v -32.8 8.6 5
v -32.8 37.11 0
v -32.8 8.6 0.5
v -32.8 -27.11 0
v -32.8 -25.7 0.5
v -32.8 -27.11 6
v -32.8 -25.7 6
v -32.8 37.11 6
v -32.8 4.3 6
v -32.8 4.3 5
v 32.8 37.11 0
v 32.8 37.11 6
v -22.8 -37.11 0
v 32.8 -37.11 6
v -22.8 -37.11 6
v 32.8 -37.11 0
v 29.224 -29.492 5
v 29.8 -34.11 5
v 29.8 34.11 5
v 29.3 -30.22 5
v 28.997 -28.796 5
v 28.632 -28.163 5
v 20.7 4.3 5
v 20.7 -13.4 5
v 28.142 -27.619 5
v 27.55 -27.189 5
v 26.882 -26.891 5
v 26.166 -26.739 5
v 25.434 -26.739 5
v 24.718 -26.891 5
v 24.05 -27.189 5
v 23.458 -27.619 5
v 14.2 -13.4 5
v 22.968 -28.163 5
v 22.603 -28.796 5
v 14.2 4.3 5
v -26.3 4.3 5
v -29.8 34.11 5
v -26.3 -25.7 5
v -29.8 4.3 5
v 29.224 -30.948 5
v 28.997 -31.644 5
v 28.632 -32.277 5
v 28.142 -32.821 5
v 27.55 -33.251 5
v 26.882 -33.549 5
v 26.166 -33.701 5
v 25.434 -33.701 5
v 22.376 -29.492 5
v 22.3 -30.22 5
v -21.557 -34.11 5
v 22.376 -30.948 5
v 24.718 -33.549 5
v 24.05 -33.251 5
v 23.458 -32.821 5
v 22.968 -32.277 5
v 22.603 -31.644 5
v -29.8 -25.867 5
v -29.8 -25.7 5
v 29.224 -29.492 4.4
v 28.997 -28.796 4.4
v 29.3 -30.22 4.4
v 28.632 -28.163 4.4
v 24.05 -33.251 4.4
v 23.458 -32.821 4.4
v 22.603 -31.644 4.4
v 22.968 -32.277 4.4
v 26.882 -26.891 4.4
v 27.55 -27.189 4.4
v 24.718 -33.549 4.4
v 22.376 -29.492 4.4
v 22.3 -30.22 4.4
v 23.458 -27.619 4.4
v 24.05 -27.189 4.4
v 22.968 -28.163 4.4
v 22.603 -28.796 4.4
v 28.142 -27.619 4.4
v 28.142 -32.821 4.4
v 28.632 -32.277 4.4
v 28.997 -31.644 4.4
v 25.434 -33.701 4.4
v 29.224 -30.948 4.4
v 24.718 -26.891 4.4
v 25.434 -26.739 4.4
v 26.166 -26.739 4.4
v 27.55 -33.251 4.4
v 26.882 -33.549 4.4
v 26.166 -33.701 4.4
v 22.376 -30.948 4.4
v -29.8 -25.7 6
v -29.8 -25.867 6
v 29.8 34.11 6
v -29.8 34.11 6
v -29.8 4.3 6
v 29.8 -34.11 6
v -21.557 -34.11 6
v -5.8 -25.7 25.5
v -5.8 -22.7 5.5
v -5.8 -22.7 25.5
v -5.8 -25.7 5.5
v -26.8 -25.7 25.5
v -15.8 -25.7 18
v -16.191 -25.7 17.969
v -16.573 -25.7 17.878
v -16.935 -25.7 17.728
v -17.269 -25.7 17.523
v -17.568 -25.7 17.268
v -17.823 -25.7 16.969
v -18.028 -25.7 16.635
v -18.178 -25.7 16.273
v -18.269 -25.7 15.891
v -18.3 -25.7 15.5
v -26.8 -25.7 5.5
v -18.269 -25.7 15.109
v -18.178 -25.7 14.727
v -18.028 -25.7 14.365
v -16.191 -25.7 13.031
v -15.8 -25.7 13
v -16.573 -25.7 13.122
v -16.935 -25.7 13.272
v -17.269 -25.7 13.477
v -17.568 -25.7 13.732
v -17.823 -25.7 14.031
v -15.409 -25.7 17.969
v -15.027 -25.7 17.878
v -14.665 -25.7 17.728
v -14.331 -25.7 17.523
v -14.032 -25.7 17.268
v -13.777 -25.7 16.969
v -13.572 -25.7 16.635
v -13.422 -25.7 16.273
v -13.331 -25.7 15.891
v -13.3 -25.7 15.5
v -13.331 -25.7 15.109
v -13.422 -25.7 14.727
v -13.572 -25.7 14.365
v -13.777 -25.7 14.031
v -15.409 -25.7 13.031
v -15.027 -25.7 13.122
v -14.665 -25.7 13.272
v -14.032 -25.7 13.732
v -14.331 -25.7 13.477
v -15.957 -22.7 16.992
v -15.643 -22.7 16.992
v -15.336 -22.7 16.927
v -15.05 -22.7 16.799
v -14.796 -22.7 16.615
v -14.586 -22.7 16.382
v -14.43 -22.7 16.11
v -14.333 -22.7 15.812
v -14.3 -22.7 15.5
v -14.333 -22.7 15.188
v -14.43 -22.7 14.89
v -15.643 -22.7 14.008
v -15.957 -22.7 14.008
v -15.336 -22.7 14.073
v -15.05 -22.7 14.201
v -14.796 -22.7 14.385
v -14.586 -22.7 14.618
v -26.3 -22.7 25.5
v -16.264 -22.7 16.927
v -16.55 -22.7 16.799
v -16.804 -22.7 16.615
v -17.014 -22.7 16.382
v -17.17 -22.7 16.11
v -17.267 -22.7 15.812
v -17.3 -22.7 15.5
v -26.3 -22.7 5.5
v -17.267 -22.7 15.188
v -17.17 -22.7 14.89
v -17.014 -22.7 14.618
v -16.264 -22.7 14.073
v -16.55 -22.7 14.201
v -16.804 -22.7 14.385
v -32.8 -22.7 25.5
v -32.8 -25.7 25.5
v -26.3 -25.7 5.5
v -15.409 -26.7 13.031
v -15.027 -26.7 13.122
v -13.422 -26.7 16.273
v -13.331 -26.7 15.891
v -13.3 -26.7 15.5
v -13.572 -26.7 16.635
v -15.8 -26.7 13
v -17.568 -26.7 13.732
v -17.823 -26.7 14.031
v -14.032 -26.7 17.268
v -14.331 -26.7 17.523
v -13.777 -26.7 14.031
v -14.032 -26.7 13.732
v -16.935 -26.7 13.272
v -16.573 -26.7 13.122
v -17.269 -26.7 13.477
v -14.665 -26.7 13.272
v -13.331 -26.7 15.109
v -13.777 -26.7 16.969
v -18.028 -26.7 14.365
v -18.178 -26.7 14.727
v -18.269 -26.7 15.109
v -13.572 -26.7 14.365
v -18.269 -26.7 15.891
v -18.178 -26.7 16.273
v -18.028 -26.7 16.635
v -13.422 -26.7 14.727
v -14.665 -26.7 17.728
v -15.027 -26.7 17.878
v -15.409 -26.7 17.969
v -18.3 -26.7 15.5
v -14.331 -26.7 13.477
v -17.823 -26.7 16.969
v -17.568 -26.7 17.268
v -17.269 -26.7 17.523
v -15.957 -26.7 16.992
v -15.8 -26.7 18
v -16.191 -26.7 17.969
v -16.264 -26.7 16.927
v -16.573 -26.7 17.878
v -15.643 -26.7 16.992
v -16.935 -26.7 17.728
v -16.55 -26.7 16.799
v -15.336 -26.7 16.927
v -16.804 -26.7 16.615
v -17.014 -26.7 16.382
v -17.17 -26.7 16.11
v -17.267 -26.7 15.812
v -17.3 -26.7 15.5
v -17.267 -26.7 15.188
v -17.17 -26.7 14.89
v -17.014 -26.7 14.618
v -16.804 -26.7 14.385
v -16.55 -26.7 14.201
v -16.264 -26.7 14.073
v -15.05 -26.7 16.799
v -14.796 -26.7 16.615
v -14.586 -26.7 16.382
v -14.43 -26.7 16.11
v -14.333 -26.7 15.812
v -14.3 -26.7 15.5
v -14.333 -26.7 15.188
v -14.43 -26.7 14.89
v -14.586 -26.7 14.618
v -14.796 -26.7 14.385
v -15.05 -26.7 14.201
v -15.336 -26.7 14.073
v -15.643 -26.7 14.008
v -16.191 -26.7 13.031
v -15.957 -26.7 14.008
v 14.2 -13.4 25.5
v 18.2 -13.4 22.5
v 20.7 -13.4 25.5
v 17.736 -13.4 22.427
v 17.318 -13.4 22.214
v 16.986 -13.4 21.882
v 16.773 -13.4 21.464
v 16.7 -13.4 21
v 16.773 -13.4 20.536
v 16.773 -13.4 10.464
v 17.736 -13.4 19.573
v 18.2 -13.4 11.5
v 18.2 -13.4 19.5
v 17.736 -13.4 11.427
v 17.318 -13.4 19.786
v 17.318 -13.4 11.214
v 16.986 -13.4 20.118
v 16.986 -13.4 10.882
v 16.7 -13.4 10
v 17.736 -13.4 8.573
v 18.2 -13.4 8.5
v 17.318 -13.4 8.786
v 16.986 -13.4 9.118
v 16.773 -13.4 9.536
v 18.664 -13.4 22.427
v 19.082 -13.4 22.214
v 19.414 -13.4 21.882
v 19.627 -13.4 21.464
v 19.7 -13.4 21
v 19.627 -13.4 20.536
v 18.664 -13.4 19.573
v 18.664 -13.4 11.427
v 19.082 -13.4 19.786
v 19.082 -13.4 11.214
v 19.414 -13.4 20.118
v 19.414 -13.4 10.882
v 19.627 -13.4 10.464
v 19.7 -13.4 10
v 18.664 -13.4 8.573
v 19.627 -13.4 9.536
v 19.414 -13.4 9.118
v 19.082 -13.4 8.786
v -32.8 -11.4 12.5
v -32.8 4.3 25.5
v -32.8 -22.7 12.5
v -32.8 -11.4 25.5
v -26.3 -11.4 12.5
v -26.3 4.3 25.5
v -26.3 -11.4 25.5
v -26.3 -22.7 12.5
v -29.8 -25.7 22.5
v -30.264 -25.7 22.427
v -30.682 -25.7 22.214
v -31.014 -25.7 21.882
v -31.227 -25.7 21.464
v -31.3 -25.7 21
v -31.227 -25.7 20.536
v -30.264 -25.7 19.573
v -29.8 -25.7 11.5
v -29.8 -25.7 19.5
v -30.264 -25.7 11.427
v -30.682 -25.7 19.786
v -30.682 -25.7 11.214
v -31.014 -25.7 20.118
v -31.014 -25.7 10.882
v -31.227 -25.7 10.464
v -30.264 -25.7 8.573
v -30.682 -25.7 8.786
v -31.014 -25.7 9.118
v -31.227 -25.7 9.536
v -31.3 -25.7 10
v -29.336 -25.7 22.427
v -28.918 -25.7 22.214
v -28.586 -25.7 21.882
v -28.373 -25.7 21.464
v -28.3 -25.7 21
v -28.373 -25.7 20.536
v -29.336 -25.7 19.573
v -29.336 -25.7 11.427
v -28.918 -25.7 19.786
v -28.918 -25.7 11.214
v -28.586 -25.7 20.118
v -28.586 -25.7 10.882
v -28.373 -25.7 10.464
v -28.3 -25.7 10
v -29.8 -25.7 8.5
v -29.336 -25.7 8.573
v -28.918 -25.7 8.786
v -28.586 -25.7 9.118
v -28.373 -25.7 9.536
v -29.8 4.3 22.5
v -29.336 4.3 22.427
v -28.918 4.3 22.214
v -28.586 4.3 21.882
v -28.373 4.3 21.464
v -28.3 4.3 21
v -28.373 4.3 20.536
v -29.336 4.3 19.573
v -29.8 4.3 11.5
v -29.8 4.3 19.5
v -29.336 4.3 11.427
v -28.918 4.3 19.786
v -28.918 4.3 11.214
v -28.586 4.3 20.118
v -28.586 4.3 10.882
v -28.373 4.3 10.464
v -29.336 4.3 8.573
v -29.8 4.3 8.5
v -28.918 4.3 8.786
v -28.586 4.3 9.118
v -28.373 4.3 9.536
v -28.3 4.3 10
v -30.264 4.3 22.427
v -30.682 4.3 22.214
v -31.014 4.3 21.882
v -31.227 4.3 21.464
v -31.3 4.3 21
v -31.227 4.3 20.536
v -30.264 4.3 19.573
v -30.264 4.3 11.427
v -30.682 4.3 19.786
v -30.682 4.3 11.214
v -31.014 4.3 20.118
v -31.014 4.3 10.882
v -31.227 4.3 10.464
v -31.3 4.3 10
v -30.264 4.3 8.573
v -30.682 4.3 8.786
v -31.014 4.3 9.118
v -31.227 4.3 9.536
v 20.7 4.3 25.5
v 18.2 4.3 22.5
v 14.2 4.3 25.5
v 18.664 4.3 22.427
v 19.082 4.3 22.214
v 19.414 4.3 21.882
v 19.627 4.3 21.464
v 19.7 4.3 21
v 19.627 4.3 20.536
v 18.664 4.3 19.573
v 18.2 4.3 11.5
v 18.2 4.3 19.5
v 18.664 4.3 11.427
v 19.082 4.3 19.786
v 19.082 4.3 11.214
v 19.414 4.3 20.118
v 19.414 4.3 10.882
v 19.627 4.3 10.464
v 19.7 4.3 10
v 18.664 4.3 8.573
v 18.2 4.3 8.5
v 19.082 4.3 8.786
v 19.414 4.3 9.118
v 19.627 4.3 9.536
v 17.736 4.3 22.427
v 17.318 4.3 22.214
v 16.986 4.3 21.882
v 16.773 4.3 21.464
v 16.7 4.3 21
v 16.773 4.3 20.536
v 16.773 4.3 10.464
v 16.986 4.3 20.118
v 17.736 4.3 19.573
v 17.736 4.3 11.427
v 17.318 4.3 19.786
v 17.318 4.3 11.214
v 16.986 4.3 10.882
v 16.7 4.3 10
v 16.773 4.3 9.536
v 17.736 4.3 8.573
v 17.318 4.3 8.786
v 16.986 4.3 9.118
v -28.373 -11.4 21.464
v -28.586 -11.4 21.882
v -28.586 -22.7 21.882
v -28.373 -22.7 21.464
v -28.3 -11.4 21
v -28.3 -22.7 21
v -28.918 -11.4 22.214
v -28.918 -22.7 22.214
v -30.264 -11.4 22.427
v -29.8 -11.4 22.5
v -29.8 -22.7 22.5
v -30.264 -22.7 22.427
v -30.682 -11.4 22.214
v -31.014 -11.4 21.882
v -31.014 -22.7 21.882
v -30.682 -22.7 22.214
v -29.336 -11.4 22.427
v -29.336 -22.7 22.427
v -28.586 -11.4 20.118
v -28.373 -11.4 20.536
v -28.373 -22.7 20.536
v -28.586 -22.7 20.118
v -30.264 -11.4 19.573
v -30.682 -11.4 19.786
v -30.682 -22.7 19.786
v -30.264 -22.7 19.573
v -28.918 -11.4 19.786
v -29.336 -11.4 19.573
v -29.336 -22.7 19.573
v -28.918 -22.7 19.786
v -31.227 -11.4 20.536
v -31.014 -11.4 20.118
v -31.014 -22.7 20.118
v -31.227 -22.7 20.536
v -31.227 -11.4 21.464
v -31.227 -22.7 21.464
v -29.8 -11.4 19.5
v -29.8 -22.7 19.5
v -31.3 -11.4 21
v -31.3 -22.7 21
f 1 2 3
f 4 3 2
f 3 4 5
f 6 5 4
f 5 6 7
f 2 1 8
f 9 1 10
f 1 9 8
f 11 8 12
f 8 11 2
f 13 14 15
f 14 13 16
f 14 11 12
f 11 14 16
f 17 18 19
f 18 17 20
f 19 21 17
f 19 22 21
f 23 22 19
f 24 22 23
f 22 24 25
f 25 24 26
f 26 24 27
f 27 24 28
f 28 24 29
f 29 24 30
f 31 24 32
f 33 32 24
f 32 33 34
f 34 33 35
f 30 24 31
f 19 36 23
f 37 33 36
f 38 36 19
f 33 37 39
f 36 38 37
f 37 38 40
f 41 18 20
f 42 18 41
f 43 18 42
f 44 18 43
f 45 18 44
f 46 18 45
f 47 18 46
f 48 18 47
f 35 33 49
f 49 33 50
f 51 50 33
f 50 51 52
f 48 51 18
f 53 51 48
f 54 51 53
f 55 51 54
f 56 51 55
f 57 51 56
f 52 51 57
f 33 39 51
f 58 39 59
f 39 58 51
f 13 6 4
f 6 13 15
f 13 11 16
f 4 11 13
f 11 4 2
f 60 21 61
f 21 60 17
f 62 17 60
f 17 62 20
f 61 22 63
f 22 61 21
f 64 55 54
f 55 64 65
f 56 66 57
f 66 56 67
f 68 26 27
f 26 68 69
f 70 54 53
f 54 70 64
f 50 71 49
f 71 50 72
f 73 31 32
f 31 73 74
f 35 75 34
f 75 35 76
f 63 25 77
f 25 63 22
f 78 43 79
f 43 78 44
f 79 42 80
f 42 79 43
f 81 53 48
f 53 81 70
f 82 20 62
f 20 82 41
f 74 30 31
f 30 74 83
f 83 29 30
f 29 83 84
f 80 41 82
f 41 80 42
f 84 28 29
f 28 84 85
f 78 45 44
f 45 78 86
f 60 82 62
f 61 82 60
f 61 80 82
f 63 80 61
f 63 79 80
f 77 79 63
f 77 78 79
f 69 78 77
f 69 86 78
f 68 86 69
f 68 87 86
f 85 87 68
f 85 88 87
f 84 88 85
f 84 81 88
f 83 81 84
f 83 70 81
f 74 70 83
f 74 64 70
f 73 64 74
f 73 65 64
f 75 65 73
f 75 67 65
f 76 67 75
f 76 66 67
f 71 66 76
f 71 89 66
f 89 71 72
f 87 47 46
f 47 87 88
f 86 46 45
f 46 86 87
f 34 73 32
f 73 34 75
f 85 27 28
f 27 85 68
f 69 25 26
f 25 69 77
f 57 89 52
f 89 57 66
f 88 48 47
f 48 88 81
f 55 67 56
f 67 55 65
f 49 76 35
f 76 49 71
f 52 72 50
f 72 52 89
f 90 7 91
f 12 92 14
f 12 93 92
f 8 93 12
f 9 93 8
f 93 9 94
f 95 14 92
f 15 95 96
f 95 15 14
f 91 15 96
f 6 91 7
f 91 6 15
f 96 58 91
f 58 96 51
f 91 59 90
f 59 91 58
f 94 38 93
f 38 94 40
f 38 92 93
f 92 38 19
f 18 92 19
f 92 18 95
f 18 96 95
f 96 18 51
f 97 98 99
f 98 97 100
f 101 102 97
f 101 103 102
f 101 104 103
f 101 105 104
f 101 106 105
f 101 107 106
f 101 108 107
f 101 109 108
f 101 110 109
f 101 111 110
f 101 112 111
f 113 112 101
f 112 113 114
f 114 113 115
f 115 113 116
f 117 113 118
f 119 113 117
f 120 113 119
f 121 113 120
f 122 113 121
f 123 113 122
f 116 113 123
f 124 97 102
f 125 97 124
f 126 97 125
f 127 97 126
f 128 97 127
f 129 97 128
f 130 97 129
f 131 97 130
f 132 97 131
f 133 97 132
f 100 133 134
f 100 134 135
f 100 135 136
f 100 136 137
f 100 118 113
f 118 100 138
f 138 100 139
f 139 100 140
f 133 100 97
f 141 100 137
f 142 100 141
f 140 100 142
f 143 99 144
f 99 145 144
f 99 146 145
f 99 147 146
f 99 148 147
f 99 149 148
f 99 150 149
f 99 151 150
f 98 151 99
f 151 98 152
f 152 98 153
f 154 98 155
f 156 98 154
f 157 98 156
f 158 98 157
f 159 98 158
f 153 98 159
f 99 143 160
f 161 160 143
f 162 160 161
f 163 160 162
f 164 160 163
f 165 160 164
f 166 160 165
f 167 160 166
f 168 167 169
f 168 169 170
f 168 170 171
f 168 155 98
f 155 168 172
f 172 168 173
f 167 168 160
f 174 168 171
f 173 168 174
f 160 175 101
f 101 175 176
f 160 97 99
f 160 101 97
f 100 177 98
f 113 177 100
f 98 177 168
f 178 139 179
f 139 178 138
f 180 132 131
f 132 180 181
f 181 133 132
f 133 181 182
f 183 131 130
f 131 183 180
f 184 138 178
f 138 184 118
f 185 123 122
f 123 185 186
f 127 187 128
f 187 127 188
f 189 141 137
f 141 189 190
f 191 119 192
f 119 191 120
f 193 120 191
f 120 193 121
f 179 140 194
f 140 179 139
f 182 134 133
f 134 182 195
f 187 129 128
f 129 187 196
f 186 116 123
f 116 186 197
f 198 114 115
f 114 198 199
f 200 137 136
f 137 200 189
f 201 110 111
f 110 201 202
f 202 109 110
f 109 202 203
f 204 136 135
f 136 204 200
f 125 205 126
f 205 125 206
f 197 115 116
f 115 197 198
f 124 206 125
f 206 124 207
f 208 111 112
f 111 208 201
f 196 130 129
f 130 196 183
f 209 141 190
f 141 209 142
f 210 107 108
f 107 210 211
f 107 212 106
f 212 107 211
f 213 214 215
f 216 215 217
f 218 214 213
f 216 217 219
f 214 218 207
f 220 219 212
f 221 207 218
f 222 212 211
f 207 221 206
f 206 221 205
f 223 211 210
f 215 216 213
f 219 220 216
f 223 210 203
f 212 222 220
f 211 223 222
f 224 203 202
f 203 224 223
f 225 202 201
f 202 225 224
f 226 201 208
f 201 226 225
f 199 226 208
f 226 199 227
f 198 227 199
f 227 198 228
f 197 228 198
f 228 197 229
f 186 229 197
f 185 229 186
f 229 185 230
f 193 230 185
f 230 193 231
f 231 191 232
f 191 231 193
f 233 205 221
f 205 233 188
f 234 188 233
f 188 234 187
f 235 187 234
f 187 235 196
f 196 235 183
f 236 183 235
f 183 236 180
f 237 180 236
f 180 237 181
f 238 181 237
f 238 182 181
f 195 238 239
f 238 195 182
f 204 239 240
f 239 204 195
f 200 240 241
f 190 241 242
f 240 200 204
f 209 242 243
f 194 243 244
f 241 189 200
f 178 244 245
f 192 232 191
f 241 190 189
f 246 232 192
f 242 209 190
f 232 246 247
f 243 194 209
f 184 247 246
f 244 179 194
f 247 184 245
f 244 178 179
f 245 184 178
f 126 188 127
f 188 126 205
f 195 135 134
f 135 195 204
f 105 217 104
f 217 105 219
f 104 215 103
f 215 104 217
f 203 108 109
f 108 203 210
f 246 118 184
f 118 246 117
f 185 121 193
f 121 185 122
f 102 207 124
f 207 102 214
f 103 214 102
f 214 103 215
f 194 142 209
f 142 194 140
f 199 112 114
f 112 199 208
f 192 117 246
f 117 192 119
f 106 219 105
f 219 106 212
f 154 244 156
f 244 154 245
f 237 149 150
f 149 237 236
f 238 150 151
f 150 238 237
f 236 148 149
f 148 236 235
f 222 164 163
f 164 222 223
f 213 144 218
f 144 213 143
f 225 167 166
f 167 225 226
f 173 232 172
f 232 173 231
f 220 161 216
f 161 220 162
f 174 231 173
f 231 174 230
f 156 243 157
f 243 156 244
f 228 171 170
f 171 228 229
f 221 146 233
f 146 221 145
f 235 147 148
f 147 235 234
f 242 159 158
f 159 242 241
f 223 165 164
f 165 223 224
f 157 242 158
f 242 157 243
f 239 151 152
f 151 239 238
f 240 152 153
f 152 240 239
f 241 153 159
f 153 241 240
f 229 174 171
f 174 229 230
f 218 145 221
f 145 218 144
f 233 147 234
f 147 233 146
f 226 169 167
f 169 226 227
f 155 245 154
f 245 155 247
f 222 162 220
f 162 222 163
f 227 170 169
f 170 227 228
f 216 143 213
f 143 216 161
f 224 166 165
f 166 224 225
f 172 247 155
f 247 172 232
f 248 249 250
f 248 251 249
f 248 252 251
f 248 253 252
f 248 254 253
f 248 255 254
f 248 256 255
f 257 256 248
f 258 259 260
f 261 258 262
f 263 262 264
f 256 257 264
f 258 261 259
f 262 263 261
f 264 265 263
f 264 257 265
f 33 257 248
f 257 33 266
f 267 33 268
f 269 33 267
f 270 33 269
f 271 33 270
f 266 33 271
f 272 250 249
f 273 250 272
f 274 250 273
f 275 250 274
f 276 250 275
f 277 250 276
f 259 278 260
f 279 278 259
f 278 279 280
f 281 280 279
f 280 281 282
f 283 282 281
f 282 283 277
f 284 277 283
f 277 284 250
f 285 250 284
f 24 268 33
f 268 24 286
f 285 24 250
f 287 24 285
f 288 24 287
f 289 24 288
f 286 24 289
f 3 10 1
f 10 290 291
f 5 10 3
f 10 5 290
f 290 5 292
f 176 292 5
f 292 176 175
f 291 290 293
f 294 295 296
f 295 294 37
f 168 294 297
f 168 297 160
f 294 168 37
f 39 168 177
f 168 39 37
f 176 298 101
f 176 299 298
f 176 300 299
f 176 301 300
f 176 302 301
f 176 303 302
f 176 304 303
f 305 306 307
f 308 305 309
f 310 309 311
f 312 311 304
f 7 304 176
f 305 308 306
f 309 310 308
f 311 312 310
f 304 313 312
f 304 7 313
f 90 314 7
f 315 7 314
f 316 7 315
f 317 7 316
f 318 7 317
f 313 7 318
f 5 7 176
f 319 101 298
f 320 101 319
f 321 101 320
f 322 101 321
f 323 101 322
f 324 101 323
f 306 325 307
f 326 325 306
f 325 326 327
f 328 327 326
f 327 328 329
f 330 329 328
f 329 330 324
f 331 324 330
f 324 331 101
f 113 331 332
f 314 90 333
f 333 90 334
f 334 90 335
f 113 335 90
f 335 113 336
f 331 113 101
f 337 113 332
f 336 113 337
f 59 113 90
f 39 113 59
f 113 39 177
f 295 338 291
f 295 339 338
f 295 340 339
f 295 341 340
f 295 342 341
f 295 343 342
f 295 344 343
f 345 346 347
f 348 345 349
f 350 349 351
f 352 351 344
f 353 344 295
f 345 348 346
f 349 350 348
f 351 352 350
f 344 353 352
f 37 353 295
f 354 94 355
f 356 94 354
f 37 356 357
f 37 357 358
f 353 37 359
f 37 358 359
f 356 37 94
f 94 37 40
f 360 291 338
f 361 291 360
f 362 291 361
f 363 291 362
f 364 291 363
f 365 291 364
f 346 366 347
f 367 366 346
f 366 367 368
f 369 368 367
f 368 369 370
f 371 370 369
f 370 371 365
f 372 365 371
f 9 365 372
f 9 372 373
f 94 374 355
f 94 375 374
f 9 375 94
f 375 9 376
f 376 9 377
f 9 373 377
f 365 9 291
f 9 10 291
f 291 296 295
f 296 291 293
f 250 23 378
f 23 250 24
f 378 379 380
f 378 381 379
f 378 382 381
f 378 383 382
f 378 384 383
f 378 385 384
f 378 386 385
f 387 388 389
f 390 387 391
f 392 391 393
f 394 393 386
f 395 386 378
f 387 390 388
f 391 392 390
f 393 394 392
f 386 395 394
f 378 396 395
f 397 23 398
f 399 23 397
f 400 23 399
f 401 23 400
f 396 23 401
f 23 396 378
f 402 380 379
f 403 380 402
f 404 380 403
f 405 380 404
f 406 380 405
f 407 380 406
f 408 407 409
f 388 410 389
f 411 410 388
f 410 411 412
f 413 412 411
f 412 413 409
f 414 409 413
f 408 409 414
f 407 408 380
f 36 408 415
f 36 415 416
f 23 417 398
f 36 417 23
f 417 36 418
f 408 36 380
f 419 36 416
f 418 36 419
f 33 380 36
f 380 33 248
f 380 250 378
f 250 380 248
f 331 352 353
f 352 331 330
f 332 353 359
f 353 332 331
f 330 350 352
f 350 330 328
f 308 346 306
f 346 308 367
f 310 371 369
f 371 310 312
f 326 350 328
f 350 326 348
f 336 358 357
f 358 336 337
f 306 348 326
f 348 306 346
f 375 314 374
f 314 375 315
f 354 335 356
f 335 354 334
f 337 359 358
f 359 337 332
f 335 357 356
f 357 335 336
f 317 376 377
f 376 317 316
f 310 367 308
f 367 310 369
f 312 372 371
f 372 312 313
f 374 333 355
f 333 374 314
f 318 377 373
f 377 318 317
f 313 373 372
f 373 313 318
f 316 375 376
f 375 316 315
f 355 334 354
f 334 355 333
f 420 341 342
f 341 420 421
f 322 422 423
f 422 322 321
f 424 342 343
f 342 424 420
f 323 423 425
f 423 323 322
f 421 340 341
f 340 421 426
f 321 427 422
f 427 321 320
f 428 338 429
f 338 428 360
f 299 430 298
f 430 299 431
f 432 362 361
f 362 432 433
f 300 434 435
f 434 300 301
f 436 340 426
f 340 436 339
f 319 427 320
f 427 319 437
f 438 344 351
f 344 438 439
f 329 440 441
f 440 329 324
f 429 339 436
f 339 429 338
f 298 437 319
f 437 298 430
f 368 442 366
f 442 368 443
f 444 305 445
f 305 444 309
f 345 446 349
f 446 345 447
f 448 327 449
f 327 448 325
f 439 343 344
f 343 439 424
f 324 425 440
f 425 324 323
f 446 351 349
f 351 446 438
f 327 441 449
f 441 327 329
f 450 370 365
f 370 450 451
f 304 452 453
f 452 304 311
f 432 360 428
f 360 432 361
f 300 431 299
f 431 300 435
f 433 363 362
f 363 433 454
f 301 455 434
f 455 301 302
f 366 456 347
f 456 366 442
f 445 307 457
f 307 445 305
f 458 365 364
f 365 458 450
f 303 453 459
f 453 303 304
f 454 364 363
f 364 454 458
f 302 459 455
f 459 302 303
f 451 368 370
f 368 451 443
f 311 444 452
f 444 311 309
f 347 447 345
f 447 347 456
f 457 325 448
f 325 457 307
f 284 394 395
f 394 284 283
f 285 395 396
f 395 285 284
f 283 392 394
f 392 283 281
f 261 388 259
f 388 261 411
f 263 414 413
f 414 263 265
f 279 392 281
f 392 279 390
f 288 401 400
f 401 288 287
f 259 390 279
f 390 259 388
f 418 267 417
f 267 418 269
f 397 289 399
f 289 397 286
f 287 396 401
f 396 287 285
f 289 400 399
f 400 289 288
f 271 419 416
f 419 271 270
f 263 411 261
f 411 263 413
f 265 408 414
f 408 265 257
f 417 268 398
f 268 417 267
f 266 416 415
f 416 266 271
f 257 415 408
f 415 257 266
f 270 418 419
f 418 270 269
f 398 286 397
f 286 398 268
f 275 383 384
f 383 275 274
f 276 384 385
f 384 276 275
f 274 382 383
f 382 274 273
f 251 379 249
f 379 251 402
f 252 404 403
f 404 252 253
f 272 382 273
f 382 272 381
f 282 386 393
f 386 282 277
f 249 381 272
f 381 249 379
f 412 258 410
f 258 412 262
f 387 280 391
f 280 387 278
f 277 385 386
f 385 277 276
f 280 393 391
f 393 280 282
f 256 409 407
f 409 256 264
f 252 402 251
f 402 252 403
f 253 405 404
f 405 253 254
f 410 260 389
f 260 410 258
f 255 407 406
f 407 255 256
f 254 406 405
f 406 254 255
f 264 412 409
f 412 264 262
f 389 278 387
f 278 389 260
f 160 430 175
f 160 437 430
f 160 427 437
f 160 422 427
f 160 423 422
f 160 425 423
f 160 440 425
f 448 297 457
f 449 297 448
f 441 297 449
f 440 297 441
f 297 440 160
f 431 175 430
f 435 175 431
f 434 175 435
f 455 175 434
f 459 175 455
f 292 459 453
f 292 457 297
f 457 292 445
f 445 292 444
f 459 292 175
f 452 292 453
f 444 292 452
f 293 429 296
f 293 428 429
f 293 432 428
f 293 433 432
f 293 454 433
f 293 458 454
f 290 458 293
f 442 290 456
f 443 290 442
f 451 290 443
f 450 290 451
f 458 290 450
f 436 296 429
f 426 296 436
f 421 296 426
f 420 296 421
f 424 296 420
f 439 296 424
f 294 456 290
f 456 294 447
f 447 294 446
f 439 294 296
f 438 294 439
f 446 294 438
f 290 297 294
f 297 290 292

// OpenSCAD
%import("Servo13.stl");
servo();
*translate([-20,-20,0]) difference() {
  cylinder(d=20,h=3,$fn=40);
  for(r=[0:45:359]) rotate([0,0,r]) translate([7.5,0,-.01]) cylinder(d=2,h=3.02,$fn=12);
  translate([0,0,-.01]) cylinder(d=3,h=3.02,$fn=30);
  translate([0,0,1.2]) cylinder(d=9,h=3,$fn=40);
}
!union()
{
  foot();
  translate([-30,-18,0]) cube([50,30,5]);
  translate([-25.8,16.8,5.5]) rotate([90,0])
  {
    topmod();
    sidemod();
  }
}
*vertical();
module foot() {
  *translate([-121.11,-33.82]) import("Chip-E_-_RobotGeek_Biped/files/Foot_Left.stl"); 
  *translate([-32.8,-37.11]) cube([65.6,74.3,5]);
  footpath=[[-22.8,-37.11],[32.8,-37.11],[32.8,37.11],[-32.8,37.11],[-32.8,-27.11]];
  difference() {
    linear_extrude(5) polygon(footpath);
    translate([32.8-7,-33.82+3.6,4.4]) cylinder(d=7,h=2,$fn=30);
  }
  linear_extrude(6) difference() {
    polygon(footpath);
    offset(r=-3) polygon(footpath);
  }
}
module vertical() {
  mirror([0,0,1])
  difference() {
    intersection() {
      sidemod(1);
      translate([-7,-5]) cube([54,30,16]);
    }
    translate([-4,5]) cube([10,10,30]);
  }
}
module sidemod(both=0) {
  translate([0,10]) for(m=both?[0,1]:[0]) mirror([0,m,0]) translate([-7,-5-10,8.2]) difference(){
    union(){
      cube([54,4.5,22]);
      translate([0,0,4.3]) cube([6.5,25,30]);
      translate([47,0,4.3]) cube([6.5,25,17.7]);
    }
    *translate([-.01,-.01,22]) cube([8,5,14.5]);
    translate([-.01,12,20]) cube([10,14,11.3]);
    translate([7,-.01,both?8:3]) cube([39,28,16]);
    /*
    rotate([0,0,45]) translate([-1,-8,-2]) cube([5.3,30,40]);
    translate([-1,-8,-2]) cube([5.3,13,40]);
    translate([48,0]) rotate([0,0,-45]) translate([-1,-8,-2]) cube([5.3,30,40]);
    translate([50,0]) translate([-1,-8,-2]) cube([5.3,13,40]);
    */
    for(x=[3,51],y=[9.5,20.5])
      translate([x,y,0]) cylinder(d=3,h=40,$fn=20);
    for(x=[9.6,24.5,29.5,44.5])
      translate([x,2.5,-.01]) cylinder(d=2.5,h=30,$fn=20);
  }
}
module topmod() {
translate([0,0,40.5]) {
  difference(){
    union(){
      translate([-1,0,-1]) cube([21,20,3]);
      translate([10,10]) cylinder(d=5,h=3,$fn=40);
    }
    translate([10,10,-1.02]) cylinder(d=3,h=5.02,$fn=30);
  }
  *translate([10,10]) 
    cylinder(d=6,h=3,$fn=30);
}
}
module servo() {
cube([40,20,37]);
  #translate([11,10,-2]) cylinder(d=6,h=48,$fn=20);
translate([-6.25,0,10]) difference() {
  cube([52.5,20,2.3]);
  for(x=[2,50.5],y=[4.5,15.5])
  translate([x,y,-.01]) cylinder(d=4.5,h=3,$fn=30);
}
}
